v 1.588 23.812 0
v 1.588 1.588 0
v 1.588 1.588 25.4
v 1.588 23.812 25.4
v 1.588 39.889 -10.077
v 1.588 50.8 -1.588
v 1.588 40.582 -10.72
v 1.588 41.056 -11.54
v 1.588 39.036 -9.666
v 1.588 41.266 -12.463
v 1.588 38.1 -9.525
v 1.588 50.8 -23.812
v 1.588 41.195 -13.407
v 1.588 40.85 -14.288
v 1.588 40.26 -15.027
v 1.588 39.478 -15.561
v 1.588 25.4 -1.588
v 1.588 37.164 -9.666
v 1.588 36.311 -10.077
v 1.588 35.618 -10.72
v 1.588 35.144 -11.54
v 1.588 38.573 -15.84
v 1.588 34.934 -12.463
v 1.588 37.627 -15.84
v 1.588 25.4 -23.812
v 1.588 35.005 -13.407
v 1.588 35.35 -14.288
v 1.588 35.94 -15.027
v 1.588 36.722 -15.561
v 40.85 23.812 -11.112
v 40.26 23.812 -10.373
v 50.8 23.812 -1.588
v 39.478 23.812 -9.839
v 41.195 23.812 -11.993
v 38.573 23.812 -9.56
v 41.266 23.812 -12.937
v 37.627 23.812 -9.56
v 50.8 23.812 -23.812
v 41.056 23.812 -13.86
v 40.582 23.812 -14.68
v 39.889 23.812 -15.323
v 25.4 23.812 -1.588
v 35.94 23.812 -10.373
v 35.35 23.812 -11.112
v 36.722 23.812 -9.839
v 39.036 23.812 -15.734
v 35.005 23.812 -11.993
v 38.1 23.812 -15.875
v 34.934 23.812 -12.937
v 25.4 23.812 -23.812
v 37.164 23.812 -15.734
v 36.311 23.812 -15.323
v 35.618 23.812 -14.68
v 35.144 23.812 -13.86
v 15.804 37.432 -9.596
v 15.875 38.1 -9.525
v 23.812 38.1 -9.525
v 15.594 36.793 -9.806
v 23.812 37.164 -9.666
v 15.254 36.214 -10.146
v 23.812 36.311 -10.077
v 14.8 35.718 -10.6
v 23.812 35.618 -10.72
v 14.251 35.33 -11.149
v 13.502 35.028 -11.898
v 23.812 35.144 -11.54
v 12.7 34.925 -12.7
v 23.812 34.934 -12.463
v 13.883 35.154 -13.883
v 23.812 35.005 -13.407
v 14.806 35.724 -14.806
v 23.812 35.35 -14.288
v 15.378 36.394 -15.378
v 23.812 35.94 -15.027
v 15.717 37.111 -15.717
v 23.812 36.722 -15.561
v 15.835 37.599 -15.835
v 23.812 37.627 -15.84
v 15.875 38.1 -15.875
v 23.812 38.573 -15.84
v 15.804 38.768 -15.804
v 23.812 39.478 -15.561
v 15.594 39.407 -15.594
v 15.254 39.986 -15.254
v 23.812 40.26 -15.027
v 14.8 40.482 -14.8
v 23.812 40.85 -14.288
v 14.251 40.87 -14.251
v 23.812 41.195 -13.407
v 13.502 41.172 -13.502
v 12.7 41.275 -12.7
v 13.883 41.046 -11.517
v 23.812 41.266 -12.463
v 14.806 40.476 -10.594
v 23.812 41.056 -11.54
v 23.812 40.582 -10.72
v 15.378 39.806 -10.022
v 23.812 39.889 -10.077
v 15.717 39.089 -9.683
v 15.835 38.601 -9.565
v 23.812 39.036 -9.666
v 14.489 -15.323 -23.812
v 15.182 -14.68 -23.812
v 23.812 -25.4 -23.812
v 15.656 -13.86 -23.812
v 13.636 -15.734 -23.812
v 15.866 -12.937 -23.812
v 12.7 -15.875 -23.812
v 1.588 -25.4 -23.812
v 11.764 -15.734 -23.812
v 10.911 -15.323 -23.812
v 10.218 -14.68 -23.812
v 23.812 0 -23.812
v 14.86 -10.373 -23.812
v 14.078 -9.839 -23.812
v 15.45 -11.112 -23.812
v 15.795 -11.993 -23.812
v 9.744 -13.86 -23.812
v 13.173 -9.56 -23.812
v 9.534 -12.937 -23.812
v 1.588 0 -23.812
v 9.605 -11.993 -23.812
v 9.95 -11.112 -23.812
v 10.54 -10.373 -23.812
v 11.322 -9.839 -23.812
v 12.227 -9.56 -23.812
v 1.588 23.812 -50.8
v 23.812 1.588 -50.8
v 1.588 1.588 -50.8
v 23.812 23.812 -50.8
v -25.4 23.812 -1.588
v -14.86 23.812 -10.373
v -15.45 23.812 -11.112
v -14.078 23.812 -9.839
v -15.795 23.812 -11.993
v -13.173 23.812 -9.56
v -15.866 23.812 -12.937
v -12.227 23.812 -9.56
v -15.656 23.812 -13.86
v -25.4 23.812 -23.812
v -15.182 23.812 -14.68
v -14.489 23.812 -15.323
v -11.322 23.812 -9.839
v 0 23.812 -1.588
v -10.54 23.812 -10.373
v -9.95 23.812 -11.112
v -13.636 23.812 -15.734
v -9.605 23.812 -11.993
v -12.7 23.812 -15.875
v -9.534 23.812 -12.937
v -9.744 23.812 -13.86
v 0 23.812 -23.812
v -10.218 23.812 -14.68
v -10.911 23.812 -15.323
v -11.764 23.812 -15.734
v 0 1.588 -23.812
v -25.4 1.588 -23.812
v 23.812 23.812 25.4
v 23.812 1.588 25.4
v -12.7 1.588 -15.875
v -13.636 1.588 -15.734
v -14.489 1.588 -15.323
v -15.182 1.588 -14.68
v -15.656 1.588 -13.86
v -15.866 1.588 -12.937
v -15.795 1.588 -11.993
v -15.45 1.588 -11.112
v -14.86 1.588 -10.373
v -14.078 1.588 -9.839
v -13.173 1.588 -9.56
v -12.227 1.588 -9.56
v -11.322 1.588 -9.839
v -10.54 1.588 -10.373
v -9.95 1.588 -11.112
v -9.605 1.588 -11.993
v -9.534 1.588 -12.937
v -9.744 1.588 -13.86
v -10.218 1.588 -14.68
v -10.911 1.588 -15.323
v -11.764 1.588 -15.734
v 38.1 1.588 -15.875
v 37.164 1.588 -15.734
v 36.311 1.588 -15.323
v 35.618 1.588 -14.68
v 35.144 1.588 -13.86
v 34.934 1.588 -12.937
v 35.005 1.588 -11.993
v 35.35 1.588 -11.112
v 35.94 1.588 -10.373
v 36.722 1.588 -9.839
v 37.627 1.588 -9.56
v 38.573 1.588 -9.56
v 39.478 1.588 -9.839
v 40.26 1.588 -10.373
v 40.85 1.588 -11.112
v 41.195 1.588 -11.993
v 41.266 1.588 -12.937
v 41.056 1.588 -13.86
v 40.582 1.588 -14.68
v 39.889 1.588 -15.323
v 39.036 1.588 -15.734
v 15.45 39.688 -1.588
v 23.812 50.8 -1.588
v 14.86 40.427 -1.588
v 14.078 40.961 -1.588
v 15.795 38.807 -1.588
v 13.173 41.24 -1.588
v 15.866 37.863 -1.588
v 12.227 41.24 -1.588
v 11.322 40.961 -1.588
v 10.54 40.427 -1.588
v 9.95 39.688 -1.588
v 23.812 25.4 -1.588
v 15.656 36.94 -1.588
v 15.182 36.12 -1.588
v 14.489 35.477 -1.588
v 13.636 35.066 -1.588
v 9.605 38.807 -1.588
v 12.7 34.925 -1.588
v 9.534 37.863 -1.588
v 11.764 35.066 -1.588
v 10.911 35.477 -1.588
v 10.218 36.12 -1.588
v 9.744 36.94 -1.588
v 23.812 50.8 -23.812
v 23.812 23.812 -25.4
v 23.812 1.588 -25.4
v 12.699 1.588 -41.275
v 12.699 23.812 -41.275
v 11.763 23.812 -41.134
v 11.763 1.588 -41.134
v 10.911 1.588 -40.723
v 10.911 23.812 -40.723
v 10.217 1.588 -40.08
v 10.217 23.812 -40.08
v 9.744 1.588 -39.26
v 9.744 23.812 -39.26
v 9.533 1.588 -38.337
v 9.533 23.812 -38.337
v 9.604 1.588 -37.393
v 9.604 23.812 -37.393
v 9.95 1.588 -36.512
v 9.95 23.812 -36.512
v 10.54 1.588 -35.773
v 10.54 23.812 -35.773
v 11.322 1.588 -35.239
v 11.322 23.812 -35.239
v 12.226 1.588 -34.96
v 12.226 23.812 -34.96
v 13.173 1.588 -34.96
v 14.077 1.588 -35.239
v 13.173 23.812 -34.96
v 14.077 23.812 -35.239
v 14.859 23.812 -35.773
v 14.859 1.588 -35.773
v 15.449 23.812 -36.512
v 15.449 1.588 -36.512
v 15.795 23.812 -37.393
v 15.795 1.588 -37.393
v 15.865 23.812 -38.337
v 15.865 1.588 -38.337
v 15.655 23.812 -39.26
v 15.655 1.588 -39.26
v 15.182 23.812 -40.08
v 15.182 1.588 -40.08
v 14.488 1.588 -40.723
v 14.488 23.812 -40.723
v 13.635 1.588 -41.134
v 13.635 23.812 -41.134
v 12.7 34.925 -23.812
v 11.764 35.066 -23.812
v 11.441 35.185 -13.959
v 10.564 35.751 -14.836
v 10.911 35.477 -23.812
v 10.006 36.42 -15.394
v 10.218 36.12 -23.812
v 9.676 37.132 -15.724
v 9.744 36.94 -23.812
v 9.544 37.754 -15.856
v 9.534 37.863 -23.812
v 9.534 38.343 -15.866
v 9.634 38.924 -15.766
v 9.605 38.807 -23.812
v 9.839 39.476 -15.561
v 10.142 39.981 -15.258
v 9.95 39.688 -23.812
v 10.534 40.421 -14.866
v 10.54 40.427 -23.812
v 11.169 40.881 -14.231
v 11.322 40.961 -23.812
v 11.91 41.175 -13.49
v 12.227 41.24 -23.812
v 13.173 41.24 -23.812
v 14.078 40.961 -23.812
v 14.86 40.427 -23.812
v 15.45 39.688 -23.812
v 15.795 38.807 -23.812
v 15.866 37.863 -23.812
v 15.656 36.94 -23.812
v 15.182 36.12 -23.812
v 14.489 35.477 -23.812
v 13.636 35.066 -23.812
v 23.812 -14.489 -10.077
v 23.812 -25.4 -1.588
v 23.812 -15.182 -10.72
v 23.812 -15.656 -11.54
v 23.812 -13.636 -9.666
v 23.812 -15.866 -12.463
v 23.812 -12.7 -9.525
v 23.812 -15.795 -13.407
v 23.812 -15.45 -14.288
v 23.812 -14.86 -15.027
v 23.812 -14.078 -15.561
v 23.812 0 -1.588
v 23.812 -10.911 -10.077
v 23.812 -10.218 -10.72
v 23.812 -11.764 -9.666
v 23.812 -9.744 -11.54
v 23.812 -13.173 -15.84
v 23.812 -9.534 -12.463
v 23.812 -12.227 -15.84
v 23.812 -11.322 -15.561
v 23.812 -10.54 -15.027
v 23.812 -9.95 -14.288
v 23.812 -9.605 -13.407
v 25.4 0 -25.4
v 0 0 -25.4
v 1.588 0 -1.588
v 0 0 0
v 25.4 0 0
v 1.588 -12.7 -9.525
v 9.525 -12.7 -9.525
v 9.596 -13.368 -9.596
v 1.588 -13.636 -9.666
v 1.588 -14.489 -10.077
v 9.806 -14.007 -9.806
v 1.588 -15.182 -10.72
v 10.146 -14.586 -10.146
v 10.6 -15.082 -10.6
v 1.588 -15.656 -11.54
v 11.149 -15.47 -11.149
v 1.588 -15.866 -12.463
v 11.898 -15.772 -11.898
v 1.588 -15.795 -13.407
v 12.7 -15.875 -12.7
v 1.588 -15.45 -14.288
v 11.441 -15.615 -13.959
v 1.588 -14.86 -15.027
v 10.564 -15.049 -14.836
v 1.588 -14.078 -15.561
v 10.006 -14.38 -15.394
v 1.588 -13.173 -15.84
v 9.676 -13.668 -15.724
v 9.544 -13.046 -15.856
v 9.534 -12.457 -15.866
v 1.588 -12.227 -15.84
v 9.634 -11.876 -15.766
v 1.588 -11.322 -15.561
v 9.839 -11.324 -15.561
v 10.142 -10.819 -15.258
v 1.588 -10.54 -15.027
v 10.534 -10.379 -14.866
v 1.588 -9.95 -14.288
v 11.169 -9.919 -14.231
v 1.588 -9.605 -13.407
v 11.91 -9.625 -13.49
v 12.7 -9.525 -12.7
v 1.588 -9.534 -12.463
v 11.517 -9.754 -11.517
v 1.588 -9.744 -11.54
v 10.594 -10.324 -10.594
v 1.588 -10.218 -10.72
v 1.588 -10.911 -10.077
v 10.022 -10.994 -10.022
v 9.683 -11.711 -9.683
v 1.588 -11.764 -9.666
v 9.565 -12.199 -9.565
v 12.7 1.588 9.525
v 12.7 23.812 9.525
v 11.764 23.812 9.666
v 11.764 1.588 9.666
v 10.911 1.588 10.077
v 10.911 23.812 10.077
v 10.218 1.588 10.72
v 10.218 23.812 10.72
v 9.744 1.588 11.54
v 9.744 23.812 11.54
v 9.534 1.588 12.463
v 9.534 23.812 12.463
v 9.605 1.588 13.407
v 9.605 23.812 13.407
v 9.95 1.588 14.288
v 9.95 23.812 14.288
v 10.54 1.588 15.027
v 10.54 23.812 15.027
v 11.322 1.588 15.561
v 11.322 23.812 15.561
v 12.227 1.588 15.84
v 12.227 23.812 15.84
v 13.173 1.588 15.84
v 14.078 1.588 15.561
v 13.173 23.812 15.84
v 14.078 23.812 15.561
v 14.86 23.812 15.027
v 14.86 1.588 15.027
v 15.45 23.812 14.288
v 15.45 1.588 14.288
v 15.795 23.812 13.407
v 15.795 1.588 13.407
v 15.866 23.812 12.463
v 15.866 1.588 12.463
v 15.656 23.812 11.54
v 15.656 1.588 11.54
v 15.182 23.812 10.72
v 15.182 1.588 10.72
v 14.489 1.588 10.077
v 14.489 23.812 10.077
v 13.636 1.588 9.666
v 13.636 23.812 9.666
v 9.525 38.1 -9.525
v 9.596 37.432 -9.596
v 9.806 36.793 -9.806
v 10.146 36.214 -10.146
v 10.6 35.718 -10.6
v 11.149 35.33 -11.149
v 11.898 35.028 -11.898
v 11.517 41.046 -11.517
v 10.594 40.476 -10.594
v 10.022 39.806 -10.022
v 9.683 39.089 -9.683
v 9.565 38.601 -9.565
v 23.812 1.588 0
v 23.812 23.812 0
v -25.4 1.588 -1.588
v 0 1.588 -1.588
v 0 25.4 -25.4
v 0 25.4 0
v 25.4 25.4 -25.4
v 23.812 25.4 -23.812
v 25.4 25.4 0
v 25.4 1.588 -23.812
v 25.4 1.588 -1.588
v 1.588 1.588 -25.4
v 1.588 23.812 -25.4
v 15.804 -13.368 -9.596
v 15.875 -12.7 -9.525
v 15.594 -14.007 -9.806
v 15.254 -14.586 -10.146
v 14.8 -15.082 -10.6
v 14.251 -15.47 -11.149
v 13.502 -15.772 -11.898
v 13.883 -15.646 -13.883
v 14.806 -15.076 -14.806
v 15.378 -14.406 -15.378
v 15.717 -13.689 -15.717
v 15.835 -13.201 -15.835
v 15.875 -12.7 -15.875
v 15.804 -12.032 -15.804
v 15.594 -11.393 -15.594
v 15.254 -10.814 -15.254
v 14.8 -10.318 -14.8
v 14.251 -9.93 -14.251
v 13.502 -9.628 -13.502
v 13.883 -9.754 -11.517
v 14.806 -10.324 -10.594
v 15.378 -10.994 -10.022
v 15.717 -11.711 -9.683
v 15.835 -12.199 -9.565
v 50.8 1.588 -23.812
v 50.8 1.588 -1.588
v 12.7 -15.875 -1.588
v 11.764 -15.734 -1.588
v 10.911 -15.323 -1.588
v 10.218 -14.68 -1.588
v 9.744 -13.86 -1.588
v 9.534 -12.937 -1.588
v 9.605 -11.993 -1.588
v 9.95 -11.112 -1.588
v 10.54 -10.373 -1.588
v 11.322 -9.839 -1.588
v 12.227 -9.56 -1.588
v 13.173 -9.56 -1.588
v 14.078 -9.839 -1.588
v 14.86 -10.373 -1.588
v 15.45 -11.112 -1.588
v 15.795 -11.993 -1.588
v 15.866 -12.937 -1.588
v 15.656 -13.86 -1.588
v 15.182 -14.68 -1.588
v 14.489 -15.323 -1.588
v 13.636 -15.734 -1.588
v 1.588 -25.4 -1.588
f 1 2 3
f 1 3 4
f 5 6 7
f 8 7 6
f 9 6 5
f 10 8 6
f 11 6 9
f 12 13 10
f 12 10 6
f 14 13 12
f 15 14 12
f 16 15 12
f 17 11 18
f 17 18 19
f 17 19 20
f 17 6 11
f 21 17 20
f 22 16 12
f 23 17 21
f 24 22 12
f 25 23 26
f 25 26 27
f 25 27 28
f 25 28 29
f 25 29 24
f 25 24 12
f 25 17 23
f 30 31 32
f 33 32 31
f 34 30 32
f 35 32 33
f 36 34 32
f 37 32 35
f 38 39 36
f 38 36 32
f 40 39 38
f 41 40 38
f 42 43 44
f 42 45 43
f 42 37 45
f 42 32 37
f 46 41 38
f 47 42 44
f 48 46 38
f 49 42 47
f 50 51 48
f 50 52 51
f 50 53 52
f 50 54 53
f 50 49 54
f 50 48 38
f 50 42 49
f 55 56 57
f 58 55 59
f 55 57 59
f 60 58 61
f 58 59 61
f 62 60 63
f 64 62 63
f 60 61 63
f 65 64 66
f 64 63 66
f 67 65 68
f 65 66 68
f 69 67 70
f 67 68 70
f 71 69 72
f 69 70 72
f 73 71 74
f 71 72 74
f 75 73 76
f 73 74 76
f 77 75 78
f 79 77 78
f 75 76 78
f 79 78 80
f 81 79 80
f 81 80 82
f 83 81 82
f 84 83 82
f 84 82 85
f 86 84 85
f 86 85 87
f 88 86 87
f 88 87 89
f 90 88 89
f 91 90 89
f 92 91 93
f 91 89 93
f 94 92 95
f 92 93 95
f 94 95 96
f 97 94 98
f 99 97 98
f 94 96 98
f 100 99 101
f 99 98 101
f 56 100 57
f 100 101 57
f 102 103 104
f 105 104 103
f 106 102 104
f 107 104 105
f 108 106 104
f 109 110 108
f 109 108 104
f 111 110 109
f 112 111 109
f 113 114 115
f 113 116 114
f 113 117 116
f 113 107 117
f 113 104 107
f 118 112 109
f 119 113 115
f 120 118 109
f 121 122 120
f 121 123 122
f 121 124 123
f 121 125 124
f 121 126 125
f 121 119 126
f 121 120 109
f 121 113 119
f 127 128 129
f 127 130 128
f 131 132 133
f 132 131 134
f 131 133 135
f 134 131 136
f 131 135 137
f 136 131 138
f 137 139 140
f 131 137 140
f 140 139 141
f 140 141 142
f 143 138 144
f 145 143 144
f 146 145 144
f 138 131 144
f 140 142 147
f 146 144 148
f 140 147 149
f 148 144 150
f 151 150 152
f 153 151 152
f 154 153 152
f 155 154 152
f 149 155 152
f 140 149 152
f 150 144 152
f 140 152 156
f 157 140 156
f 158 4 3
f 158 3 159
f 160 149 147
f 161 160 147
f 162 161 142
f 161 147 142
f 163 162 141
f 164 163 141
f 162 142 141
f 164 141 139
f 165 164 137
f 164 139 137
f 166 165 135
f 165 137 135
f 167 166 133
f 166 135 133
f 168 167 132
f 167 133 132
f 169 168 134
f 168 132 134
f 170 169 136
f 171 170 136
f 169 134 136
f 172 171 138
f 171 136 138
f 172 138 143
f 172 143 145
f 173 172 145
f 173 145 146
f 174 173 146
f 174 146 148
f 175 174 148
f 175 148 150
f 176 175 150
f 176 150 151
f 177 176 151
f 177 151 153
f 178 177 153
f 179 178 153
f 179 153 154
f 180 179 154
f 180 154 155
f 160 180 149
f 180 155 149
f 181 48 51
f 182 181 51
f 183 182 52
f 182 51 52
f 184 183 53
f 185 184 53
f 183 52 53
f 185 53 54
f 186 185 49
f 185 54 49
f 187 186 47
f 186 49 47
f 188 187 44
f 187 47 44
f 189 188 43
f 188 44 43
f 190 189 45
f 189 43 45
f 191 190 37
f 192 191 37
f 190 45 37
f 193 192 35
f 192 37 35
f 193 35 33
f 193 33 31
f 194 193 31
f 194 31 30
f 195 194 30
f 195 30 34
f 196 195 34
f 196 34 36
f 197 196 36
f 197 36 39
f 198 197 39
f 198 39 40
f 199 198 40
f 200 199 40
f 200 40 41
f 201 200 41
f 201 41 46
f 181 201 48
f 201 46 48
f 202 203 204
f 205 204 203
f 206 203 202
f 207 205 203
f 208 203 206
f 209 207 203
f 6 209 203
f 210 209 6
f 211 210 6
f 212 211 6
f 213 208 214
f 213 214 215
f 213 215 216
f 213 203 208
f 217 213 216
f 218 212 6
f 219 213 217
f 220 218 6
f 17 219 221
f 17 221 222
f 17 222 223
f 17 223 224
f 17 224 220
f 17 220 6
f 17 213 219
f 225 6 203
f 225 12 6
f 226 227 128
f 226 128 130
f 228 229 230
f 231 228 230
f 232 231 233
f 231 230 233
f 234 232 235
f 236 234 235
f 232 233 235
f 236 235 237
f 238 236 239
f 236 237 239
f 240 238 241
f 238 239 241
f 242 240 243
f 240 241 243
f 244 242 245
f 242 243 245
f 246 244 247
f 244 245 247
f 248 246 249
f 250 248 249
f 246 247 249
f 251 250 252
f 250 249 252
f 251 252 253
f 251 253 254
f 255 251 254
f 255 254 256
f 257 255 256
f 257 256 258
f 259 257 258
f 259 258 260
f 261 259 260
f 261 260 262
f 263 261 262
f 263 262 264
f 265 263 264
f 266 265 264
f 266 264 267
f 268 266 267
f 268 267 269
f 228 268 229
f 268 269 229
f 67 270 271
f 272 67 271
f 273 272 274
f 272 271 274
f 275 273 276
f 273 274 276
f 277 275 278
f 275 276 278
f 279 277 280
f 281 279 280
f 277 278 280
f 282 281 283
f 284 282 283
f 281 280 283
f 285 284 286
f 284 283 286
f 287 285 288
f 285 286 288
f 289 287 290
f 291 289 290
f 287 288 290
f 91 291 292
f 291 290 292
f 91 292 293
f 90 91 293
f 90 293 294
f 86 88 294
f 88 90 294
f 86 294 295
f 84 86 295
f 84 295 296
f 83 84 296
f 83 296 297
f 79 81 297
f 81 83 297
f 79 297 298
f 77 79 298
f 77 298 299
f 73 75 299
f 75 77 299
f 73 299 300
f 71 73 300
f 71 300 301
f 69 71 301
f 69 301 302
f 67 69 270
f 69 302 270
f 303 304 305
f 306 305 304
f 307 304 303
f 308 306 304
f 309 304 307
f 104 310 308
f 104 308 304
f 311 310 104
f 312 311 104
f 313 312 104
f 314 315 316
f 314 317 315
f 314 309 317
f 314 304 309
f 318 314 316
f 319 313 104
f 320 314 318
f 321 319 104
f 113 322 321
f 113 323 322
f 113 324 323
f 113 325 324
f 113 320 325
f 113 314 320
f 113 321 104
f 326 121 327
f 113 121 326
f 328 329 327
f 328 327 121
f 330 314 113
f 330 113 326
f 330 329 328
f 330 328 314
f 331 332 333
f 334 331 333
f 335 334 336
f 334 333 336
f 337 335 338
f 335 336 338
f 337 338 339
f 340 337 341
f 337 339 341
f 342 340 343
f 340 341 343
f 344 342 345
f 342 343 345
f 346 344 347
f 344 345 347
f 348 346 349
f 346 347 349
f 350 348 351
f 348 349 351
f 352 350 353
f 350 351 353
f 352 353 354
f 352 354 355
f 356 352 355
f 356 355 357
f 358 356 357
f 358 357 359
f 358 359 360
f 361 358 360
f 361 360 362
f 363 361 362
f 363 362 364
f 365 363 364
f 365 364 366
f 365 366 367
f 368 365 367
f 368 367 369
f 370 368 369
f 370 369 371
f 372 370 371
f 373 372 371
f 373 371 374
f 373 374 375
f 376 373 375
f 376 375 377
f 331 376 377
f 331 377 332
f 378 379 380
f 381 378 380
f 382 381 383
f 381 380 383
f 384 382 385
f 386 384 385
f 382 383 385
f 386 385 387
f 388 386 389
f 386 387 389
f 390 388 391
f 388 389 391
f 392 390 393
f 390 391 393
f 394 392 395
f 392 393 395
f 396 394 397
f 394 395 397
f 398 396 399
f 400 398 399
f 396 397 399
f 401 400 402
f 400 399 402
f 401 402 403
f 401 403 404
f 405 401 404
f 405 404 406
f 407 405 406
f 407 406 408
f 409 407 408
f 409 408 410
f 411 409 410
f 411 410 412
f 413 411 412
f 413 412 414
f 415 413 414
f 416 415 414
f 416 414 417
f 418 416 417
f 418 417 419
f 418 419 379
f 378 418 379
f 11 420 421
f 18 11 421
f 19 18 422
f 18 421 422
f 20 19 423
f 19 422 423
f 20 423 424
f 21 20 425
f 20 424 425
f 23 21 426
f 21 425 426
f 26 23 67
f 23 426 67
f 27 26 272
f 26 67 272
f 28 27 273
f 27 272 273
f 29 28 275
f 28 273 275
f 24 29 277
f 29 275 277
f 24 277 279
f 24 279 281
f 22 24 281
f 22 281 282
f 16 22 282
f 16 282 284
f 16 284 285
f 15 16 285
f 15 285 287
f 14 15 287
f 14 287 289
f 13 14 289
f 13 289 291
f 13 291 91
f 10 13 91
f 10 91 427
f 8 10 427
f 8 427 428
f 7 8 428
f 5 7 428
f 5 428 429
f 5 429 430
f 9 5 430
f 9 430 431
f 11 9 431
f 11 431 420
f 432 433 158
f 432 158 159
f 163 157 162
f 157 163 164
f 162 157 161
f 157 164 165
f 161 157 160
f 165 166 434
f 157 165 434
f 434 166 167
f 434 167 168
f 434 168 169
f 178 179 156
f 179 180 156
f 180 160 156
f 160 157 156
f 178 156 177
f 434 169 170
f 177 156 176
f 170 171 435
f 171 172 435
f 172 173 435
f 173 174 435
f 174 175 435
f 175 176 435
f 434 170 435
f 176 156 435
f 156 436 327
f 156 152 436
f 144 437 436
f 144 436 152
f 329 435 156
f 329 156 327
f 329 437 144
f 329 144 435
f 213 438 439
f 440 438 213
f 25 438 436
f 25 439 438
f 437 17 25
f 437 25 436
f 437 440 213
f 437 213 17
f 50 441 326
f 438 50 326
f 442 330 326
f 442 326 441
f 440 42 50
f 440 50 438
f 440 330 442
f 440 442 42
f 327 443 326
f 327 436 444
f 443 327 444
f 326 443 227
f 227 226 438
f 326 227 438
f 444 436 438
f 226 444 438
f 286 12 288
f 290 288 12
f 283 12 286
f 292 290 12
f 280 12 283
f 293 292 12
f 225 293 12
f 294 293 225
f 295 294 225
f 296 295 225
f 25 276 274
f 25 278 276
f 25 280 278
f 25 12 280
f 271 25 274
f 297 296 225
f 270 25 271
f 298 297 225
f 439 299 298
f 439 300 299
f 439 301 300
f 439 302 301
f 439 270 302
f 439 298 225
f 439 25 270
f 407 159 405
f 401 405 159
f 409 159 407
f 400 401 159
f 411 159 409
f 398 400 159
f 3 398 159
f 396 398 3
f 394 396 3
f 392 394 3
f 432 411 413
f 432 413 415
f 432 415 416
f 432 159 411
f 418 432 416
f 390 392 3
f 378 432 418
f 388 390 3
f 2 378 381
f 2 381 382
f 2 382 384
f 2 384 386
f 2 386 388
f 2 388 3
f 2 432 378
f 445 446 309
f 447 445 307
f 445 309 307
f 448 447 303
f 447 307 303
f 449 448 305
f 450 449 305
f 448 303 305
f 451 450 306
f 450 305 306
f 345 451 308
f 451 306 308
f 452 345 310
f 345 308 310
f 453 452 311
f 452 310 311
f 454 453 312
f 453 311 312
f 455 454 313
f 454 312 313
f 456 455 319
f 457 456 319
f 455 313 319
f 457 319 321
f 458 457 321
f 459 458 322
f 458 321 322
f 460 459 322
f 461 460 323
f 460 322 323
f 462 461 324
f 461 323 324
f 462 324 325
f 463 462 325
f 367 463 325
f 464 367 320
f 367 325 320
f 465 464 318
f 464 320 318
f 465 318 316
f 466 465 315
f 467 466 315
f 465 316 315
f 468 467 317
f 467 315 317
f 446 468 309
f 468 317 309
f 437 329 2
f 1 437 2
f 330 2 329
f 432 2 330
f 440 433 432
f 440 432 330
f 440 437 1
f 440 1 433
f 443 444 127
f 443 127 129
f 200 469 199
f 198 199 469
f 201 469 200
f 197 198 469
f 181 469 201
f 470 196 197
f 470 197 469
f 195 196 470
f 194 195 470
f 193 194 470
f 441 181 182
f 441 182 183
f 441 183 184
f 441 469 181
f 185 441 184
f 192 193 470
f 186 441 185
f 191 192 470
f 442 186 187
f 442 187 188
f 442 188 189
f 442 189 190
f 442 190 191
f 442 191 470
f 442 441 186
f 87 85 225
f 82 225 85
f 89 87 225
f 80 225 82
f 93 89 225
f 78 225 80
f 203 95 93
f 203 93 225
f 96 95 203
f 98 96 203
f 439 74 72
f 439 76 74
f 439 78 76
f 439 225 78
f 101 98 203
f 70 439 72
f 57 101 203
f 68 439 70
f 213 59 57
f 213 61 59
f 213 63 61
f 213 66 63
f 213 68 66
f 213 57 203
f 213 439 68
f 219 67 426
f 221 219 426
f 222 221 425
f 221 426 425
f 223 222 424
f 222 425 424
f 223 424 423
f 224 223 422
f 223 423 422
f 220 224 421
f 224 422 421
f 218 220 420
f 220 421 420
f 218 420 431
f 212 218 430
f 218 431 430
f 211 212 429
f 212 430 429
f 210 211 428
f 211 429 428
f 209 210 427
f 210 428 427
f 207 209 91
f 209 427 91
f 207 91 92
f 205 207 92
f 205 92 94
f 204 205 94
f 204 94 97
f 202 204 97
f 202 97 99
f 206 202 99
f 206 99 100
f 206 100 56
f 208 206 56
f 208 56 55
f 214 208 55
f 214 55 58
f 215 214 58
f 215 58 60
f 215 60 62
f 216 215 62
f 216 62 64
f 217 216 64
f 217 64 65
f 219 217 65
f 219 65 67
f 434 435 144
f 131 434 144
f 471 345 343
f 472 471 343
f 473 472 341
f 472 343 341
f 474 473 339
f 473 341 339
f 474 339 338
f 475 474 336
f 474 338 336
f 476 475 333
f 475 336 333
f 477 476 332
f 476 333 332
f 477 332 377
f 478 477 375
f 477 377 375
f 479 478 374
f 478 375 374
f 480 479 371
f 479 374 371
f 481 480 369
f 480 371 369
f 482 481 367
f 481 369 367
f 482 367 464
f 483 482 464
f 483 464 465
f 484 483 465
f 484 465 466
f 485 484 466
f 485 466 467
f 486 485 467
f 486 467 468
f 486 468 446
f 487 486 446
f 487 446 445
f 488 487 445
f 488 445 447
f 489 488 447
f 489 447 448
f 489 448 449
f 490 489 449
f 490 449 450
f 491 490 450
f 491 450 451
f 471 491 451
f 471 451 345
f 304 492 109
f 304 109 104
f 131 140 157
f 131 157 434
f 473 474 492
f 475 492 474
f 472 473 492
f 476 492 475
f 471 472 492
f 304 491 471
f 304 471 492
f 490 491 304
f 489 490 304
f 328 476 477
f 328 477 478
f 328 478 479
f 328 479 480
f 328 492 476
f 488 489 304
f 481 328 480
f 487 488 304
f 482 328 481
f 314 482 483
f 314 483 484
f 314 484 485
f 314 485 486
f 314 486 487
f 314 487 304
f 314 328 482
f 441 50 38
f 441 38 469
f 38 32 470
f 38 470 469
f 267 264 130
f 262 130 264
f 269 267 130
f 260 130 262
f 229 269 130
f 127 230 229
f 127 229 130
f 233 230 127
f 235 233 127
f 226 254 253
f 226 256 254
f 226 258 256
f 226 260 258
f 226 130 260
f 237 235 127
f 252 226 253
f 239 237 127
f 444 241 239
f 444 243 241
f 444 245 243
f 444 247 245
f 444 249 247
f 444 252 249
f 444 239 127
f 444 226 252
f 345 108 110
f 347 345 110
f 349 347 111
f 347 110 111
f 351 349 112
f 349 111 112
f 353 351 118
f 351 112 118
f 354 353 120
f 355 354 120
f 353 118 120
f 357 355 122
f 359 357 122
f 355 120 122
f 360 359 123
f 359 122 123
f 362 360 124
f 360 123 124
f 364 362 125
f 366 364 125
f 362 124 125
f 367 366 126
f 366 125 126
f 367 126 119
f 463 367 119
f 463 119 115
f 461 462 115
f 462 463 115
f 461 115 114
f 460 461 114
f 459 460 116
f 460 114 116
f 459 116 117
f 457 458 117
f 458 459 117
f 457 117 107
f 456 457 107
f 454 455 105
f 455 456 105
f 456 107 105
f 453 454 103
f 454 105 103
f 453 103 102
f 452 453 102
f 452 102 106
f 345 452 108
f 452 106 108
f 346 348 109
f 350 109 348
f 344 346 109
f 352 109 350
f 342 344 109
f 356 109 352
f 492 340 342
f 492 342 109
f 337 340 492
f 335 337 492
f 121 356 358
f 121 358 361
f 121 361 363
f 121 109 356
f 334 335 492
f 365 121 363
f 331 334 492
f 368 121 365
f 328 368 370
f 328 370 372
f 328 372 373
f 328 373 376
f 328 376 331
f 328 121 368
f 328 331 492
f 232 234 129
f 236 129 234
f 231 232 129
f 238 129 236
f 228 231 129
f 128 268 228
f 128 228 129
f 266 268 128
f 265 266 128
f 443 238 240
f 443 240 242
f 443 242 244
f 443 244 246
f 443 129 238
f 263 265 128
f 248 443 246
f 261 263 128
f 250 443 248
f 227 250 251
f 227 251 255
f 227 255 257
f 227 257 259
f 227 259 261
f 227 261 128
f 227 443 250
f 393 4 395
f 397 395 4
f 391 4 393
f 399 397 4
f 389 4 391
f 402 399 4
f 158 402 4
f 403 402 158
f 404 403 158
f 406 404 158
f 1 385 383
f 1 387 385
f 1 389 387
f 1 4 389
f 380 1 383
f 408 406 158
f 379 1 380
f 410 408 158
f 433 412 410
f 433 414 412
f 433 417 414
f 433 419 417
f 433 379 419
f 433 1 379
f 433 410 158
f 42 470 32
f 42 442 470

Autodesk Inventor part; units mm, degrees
ref_plane "YZ Plane" through (0, 0, 0) normal (1, 0, 0) x (0, 1, 0)
ref_plane "XZ Plane" through (0, 0, 0) normal (0, 1, 0) x (-1, 0, 0)
ref_plane "XY Plane" through (0, 0, 0) normal (0, 0, 1) x (1, 0, 0)
sketch "Sketch1" plane through (0, 0, 0) normal (0, 0, 1) x (1, 0, 0)
  line L0 (0, 0) -> (25.4, 0)
  line L1 (25.4, 0) -> (25.4, 25.4)
  line L2 (25.4, 25.4) -> (0, 25.4)
  line L3 (0, 25.4) -> (0, 0)
  line L4 (1.5875, 23.8125) -> (23.8125, 23.8125)
  line L5 (23.8125, 23.8125) -> (23.8125, 1.5875)
  line L6 (23.8125, 1.5875) -> (1.5875, 1.5875)
  line L7 (1.5875, 1.5875) -> (1.5875, 23.8125)
  dimension "d0" = 25.4
  dimension "d1" = 25.4
  dimension "d4" = 1.5875
extrude "Extrusion1" add sketch "Sketch1" against normal blind 25.4 contours L3 L2 L1 L0 | L4 L5 L6 L7
extrude "Extrusion2" add sketch "Sketch1" along normal blind 25.4 contours L4 L5 L6 L7
sketch "Sketch2" plane through (25.4, 0, 0) normal (1, 0, 0) x (0, 0, -1)
  line L0 (25.4, 0) -> (25.4, 25.4) projected
  line L1 (0, 25.4) -> (25.4, 25.4) projected
  line L2 (0, 0) -> (0, 25.4) projected
  line L3 (0, 0) -> (25.4, 0) projected
  line L4 (23.8125, 23.8125) -> (23.8125, 1.5875)
  line L5 (23.8125, 1.5875) -> (1.5875, 1.5875)
  line L6 (1.5875, 1.5875) -> (1.5875, 23.8125)
  line L7 (1.5875, 23.8125) -> (23.8125, 23.8125)
  dimension "d8" = 1.5875
sketch "Sketch3" plane through (0, 25.4, 0) normal (0, 1, 0) x (1, 0, 0)
  line L0 (25.4, 25.4) -> (0, 25.4) projected
  line L1 (0, 0) -> (0, 25.4) projected
  line L2 (25.4, 0) -> (0, 0) projected
  line L3 (25.4, 0) -> (25.4, 25.4) projected
  line L4 (1.5875, 23.8125) -> (23.8125, 23.8125)
  line L5 (23.8125, 23.8125) -> (23.8125, 1.5875)
  line L6 (23.8125, 1.5875) -> (1.5875, 1.5875)
  line L7 (1.5875, 1.5875) -> (1.5875, 23.8125)
  dimension "d9" = 1.5875
extrude "Extrusion3" add sketch "Sketch2" along normal blind 25.4 contours L4 L5 L6 L7
extrude "Extrusion4" add sketch "Sketch3" along normal blind 25.4 contours L4 L5 L6 L7
sketch "Sketch4" plane through (0, 0, 0) normal (-1, 0, 0) x (0, 0, 1)
  line L0 (-25.4, 25.4) -> (-25.4, 0) projected
  line L1 (0, 0) -> (-25.4, 0) projected
  line L2 (0, 25.4) -> (0, 0) projected
  line L3 (0, 25.4) -> (-25.4, 25.4) projected
  line L4 (-23.8125, 23.8125) -> (-23.8125, 1.5875)
  line L5 (-23.8125, 1.5875) -> (-1.5875, 1.5875)
  line L6 (-1.5875, 1.5875) -> (-1.5875, 23.8125)
  line L7 (-1.5875, 23.8125) -> (-23.8125, 23.8125)
  dimension "d15" = 1.5875
extrude "Extrusion5" add sketch "Sketch4" along normal blind 25.4 contours L7 L6 L5 L4
sketch "Sketch5" plane through (0, 0, -25.4) normal (0, 0, -1) x (-1, 0, 0)
  line L0 (-25.4, 0) -> (-25.4, 25.4) projected
  line L1 (0, 0) -> (-25.4, 0) projected
  line L2 (0, 25.4) -> (0, 0) projected
  line L3 (-25.4, 25.4) -> (0, 25.4) projected
  line L4 (-1.5875, 23.8125) -> (-1.5875, 1.5875)
  line L5 (-1.5875, 1.5875) -> (-23.8125, 1.5875)
  line L6 (-23.8125, 1.5875) -> (-23.8125, 23.8125)
  line L7 (-23.8125, 23.8125) -> (-1.5875, 23.8125)
  dimension "d18" = 1.5875
extrude "Extrusion6" add sketch "Sketch5" along normal blind 25.4 contours L4 L5 L6 L7
sketch "Sketch6" plane through (0, 0, 0) normal (0, -1, 0) x (1, 0, 0)
  line L0 (0, -25.4) -> (25.4, -25.4) projected
  line L1 (25.4, 0) -> (25.4, -25.4) projected
  line L2 (0, 0) -> (25.4, 0) projected
  line L3 (0, 0) -> (0, -25.4) projected
  line L4 (23.8125, -23.8125) -> (1.5875, -23.8125)
  line L5 (1.5875, -23.8125) -> (1.5875, -1.5875)
  line L6 (1.5875, -1.5875) -> (23.8125, -1.5875)
  line L7 (23.8125, -1.5875) -> (23.8125, -23.8125)
  dimension "d21" = 1.5875
extrude "Extrusion7" add sketch "Sketch6" along normal blind 25.4 contours L4 L5 L6 L7
sketch "Sketch7" plane through (0, 1.5875, -23.8125) normal (0, -1, 0) x (1, 0, 0)
  line L0 (0, 22.225) -> (0, 0) projected
  line L1 (0, 23.8125) -> (25.4, 23.8125) projected
  line L2 (25.4, 23.8125) -> (25.4, -1.5875) projected
  point P0 (-12.7, 11.1125)
  point P1 (38.1, 11.1125)
  point P2 (12.6993, -14.2875)
  point P3 (12.7, 36.5125)
  dimension "d24" = 12.7
  dimension "d25" = 50.8
  dimension "d26" = 12.7
  dimension "d27" = 12.7
  dimension "d28" = 12.7
hole "Hole1" at (-12.7, 1.5875, -12.7) at (38.1, 1.5875, -12.7) at (12.6993, 1.5875, -38.1) at (12.7, 1.5875, 12.7) direction (0, 1, 0) diameter 6.35 depth 25.4 tip angle 118
sketch "Sketch8" plane through (1.5875, 0, -23.8125) normal (-1, 0, 0) x (0, 0, 1)
  line L0 (0, -25.4) -> (22.225, -25.4) projected
  line L1 (0, 0) -> (0, -25.4) projected
  point P0 (23.8125, 0)
  point P1 (11.1125, -12.7)
  point P2 (11.1125, 38.1)
  dimension "d36" = 50.8
  dimension "d37" = 12.7
  dimension "d38" = 11.1125
hole "Hole2" at (1.5875, -12.7, -12.7) at (1.5875, 38.1, -12.7) direction (1, 0, 0) diameter 6.35 depth 25.4 tip angle 118
sketch "Sketch9" plane through (1.5875, 0, -1.5875) normal (0, 0, 1) x (1, 0, 0)
  line L0 (0, -25.4) -> (22.225, -25.4) projected
  point P0 (-1.5875, 0)
  point P1 (11.1125, -12.7)
  point P2 (11.1125, 38.1)
  dimension "d46" = 50.8
  dimension "d47" = 12.7
hole "Hole3" at (12.7, -12.7, -1.5875) at (12.7, 38.1, -1.5875) direction (0, 0, -1) diameter 6.35 depth 25.4 tip angle 118
properties part number "6-way corner"
